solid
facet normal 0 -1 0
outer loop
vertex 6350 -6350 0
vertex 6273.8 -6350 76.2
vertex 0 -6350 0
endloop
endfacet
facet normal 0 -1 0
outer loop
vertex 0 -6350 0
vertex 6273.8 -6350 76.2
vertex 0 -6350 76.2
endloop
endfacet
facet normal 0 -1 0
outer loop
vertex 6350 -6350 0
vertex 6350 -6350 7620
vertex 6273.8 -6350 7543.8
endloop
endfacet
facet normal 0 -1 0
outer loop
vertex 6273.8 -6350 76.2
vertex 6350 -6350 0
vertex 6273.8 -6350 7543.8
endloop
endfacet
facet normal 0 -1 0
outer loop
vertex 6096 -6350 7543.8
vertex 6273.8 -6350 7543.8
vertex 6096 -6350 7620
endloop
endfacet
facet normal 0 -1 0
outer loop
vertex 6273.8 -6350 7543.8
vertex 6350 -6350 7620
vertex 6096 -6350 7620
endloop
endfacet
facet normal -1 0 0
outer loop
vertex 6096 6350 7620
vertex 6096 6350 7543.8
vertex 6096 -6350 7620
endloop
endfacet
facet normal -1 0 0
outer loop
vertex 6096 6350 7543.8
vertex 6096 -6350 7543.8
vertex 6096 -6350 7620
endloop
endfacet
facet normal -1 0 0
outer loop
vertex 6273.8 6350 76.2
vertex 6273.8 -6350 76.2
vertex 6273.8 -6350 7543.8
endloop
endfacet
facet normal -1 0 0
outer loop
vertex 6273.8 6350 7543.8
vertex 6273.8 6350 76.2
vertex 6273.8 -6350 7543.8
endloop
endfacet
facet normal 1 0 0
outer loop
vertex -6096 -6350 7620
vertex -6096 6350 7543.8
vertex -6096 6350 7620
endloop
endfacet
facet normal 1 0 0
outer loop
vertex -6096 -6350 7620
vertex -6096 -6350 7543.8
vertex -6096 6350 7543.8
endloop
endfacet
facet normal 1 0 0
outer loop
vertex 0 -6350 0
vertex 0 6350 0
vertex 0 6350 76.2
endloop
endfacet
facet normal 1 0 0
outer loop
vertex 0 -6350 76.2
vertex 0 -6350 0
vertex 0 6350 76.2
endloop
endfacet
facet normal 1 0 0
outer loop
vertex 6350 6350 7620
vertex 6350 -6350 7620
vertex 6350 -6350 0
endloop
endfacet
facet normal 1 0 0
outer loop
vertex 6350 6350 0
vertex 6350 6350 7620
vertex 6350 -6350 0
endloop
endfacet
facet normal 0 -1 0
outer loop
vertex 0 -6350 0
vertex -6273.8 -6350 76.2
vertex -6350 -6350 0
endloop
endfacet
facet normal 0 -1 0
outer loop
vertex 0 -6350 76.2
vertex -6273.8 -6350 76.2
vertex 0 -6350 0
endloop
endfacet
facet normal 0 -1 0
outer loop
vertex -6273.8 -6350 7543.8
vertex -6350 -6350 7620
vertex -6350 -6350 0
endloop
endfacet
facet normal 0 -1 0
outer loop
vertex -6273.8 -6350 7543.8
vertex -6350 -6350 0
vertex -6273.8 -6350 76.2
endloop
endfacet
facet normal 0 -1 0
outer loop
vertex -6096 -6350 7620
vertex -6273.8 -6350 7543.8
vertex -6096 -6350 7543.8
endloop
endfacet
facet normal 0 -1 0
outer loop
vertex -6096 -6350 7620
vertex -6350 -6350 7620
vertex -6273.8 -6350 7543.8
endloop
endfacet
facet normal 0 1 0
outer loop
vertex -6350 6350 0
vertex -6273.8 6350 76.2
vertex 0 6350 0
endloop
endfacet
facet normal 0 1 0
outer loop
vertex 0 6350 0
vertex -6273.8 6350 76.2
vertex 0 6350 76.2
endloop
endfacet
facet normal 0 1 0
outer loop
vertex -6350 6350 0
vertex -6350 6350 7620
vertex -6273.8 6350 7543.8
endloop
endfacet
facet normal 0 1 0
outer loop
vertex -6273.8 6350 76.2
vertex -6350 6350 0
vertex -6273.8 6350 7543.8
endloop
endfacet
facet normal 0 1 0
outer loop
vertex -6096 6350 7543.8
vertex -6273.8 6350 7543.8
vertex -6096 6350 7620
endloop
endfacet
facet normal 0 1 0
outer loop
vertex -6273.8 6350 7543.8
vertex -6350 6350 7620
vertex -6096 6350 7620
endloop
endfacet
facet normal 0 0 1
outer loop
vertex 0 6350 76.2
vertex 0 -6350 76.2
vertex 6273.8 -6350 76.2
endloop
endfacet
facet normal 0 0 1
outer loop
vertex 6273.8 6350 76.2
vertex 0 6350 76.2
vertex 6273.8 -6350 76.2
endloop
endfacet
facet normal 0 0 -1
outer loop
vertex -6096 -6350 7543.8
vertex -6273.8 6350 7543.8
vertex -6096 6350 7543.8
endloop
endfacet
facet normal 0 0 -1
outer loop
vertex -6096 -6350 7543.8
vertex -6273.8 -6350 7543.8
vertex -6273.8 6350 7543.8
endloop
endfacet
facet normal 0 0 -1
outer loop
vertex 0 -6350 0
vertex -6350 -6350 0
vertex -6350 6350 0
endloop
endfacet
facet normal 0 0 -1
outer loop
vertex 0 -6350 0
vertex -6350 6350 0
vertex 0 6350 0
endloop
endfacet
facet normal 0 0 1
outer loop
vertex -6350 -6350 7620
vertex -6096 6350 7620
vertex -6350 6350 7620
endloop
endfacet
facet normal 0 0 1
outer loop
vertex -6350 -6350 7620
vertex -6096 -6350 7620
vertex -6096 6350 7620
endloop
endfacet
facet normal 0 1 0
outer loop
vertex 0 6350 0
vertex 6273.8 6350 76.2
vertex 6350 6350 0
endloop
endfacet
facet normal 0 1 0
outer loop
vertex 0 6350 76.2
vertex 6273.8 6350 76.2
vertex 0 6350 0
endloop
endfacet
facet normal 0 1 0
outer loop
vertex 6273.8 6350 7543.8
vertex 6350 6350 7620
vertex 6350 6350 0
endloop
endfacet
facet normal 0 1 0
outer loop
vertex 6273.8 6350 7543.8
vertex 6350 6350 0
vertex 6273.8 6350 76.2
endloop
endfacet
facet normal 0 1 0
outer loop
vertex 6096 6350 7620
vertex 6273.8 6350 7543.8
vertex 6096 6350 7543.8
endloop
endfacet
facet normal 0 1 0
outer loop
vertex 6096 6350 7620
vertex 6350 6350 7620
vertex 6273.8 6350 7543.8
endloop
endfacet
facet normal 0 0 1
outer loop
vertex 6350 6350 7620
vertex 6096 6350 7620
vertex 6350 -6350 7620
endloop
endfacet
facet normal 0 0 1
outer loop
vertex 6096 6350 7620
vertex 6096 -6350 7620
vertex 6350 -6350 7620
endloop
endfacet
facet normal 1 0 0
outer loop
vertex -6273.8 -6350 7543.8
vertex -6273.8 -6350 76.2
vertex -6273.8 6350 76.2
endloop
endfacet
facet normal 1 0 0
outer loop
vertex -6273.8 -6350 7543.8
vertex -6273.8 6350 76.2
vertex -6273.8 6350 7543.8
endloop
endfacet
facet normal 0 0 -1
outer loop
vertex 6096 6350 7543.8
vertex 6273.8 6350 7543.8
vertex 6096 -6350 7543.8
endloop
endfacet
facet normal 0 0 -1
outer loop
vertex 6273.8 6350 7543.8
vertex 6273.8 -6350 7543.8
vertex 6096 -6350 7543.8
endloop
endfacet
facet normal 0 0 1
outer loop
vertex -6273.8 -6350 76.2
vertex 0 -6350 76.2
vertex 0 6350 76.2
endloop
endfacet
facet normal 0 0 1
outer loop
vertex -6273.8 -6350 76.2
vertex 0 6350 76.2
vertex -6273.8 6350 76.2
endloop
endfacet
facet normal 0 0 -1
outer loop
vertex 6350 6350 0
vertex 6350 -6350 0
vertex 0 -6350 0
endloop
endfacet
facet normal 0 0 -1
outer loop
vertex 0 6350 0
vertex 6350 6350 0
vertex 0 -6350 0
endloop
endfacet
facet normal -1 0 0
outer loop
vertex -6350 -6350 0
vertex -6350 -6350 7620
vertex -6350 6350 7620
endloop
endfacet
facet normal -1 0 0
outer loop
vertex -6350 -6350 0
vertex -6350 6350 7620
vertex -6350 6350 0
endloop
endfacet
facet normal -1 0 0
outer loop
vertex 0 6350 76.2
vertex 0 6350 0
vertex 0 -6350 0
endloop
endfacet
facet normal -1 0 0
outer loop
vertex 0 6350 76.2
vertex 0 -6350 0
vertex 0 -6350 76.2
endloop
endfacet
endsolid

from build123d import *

# Parameters (mm, degrees)
F1_DEPTH = 6350


# Not quite as in the source:
# - a pattern or mirror of a feature is missing from the dataset's text; its kind, count and spacing are read off the source's solid


with BuildPart() as f1:
    # F0 (on Front) → F1 (new body, symmetric)
    with BuildSketch(Plane.XZ):
        Polygon((-6096, 7620), (-6350, 7620), (-6350, 0), (0, 0), (0, 76.2), (-6273.8, 76.2), (-6273.8, 7543.8), (-6096, 7543.8), align=None)
    extrude(amount=F1_DEPTH, both=True)


with BuildPart() as f1_copies_1:
    # F1_copies: instance of F1
    add(f1.part.mirror(Plane(origin=(0, 0, 0), x_dir=(0, 0, 1), z_dir=(1, 0, 0))))


solid = Compound([f1.part, f1_copies_1.part])
